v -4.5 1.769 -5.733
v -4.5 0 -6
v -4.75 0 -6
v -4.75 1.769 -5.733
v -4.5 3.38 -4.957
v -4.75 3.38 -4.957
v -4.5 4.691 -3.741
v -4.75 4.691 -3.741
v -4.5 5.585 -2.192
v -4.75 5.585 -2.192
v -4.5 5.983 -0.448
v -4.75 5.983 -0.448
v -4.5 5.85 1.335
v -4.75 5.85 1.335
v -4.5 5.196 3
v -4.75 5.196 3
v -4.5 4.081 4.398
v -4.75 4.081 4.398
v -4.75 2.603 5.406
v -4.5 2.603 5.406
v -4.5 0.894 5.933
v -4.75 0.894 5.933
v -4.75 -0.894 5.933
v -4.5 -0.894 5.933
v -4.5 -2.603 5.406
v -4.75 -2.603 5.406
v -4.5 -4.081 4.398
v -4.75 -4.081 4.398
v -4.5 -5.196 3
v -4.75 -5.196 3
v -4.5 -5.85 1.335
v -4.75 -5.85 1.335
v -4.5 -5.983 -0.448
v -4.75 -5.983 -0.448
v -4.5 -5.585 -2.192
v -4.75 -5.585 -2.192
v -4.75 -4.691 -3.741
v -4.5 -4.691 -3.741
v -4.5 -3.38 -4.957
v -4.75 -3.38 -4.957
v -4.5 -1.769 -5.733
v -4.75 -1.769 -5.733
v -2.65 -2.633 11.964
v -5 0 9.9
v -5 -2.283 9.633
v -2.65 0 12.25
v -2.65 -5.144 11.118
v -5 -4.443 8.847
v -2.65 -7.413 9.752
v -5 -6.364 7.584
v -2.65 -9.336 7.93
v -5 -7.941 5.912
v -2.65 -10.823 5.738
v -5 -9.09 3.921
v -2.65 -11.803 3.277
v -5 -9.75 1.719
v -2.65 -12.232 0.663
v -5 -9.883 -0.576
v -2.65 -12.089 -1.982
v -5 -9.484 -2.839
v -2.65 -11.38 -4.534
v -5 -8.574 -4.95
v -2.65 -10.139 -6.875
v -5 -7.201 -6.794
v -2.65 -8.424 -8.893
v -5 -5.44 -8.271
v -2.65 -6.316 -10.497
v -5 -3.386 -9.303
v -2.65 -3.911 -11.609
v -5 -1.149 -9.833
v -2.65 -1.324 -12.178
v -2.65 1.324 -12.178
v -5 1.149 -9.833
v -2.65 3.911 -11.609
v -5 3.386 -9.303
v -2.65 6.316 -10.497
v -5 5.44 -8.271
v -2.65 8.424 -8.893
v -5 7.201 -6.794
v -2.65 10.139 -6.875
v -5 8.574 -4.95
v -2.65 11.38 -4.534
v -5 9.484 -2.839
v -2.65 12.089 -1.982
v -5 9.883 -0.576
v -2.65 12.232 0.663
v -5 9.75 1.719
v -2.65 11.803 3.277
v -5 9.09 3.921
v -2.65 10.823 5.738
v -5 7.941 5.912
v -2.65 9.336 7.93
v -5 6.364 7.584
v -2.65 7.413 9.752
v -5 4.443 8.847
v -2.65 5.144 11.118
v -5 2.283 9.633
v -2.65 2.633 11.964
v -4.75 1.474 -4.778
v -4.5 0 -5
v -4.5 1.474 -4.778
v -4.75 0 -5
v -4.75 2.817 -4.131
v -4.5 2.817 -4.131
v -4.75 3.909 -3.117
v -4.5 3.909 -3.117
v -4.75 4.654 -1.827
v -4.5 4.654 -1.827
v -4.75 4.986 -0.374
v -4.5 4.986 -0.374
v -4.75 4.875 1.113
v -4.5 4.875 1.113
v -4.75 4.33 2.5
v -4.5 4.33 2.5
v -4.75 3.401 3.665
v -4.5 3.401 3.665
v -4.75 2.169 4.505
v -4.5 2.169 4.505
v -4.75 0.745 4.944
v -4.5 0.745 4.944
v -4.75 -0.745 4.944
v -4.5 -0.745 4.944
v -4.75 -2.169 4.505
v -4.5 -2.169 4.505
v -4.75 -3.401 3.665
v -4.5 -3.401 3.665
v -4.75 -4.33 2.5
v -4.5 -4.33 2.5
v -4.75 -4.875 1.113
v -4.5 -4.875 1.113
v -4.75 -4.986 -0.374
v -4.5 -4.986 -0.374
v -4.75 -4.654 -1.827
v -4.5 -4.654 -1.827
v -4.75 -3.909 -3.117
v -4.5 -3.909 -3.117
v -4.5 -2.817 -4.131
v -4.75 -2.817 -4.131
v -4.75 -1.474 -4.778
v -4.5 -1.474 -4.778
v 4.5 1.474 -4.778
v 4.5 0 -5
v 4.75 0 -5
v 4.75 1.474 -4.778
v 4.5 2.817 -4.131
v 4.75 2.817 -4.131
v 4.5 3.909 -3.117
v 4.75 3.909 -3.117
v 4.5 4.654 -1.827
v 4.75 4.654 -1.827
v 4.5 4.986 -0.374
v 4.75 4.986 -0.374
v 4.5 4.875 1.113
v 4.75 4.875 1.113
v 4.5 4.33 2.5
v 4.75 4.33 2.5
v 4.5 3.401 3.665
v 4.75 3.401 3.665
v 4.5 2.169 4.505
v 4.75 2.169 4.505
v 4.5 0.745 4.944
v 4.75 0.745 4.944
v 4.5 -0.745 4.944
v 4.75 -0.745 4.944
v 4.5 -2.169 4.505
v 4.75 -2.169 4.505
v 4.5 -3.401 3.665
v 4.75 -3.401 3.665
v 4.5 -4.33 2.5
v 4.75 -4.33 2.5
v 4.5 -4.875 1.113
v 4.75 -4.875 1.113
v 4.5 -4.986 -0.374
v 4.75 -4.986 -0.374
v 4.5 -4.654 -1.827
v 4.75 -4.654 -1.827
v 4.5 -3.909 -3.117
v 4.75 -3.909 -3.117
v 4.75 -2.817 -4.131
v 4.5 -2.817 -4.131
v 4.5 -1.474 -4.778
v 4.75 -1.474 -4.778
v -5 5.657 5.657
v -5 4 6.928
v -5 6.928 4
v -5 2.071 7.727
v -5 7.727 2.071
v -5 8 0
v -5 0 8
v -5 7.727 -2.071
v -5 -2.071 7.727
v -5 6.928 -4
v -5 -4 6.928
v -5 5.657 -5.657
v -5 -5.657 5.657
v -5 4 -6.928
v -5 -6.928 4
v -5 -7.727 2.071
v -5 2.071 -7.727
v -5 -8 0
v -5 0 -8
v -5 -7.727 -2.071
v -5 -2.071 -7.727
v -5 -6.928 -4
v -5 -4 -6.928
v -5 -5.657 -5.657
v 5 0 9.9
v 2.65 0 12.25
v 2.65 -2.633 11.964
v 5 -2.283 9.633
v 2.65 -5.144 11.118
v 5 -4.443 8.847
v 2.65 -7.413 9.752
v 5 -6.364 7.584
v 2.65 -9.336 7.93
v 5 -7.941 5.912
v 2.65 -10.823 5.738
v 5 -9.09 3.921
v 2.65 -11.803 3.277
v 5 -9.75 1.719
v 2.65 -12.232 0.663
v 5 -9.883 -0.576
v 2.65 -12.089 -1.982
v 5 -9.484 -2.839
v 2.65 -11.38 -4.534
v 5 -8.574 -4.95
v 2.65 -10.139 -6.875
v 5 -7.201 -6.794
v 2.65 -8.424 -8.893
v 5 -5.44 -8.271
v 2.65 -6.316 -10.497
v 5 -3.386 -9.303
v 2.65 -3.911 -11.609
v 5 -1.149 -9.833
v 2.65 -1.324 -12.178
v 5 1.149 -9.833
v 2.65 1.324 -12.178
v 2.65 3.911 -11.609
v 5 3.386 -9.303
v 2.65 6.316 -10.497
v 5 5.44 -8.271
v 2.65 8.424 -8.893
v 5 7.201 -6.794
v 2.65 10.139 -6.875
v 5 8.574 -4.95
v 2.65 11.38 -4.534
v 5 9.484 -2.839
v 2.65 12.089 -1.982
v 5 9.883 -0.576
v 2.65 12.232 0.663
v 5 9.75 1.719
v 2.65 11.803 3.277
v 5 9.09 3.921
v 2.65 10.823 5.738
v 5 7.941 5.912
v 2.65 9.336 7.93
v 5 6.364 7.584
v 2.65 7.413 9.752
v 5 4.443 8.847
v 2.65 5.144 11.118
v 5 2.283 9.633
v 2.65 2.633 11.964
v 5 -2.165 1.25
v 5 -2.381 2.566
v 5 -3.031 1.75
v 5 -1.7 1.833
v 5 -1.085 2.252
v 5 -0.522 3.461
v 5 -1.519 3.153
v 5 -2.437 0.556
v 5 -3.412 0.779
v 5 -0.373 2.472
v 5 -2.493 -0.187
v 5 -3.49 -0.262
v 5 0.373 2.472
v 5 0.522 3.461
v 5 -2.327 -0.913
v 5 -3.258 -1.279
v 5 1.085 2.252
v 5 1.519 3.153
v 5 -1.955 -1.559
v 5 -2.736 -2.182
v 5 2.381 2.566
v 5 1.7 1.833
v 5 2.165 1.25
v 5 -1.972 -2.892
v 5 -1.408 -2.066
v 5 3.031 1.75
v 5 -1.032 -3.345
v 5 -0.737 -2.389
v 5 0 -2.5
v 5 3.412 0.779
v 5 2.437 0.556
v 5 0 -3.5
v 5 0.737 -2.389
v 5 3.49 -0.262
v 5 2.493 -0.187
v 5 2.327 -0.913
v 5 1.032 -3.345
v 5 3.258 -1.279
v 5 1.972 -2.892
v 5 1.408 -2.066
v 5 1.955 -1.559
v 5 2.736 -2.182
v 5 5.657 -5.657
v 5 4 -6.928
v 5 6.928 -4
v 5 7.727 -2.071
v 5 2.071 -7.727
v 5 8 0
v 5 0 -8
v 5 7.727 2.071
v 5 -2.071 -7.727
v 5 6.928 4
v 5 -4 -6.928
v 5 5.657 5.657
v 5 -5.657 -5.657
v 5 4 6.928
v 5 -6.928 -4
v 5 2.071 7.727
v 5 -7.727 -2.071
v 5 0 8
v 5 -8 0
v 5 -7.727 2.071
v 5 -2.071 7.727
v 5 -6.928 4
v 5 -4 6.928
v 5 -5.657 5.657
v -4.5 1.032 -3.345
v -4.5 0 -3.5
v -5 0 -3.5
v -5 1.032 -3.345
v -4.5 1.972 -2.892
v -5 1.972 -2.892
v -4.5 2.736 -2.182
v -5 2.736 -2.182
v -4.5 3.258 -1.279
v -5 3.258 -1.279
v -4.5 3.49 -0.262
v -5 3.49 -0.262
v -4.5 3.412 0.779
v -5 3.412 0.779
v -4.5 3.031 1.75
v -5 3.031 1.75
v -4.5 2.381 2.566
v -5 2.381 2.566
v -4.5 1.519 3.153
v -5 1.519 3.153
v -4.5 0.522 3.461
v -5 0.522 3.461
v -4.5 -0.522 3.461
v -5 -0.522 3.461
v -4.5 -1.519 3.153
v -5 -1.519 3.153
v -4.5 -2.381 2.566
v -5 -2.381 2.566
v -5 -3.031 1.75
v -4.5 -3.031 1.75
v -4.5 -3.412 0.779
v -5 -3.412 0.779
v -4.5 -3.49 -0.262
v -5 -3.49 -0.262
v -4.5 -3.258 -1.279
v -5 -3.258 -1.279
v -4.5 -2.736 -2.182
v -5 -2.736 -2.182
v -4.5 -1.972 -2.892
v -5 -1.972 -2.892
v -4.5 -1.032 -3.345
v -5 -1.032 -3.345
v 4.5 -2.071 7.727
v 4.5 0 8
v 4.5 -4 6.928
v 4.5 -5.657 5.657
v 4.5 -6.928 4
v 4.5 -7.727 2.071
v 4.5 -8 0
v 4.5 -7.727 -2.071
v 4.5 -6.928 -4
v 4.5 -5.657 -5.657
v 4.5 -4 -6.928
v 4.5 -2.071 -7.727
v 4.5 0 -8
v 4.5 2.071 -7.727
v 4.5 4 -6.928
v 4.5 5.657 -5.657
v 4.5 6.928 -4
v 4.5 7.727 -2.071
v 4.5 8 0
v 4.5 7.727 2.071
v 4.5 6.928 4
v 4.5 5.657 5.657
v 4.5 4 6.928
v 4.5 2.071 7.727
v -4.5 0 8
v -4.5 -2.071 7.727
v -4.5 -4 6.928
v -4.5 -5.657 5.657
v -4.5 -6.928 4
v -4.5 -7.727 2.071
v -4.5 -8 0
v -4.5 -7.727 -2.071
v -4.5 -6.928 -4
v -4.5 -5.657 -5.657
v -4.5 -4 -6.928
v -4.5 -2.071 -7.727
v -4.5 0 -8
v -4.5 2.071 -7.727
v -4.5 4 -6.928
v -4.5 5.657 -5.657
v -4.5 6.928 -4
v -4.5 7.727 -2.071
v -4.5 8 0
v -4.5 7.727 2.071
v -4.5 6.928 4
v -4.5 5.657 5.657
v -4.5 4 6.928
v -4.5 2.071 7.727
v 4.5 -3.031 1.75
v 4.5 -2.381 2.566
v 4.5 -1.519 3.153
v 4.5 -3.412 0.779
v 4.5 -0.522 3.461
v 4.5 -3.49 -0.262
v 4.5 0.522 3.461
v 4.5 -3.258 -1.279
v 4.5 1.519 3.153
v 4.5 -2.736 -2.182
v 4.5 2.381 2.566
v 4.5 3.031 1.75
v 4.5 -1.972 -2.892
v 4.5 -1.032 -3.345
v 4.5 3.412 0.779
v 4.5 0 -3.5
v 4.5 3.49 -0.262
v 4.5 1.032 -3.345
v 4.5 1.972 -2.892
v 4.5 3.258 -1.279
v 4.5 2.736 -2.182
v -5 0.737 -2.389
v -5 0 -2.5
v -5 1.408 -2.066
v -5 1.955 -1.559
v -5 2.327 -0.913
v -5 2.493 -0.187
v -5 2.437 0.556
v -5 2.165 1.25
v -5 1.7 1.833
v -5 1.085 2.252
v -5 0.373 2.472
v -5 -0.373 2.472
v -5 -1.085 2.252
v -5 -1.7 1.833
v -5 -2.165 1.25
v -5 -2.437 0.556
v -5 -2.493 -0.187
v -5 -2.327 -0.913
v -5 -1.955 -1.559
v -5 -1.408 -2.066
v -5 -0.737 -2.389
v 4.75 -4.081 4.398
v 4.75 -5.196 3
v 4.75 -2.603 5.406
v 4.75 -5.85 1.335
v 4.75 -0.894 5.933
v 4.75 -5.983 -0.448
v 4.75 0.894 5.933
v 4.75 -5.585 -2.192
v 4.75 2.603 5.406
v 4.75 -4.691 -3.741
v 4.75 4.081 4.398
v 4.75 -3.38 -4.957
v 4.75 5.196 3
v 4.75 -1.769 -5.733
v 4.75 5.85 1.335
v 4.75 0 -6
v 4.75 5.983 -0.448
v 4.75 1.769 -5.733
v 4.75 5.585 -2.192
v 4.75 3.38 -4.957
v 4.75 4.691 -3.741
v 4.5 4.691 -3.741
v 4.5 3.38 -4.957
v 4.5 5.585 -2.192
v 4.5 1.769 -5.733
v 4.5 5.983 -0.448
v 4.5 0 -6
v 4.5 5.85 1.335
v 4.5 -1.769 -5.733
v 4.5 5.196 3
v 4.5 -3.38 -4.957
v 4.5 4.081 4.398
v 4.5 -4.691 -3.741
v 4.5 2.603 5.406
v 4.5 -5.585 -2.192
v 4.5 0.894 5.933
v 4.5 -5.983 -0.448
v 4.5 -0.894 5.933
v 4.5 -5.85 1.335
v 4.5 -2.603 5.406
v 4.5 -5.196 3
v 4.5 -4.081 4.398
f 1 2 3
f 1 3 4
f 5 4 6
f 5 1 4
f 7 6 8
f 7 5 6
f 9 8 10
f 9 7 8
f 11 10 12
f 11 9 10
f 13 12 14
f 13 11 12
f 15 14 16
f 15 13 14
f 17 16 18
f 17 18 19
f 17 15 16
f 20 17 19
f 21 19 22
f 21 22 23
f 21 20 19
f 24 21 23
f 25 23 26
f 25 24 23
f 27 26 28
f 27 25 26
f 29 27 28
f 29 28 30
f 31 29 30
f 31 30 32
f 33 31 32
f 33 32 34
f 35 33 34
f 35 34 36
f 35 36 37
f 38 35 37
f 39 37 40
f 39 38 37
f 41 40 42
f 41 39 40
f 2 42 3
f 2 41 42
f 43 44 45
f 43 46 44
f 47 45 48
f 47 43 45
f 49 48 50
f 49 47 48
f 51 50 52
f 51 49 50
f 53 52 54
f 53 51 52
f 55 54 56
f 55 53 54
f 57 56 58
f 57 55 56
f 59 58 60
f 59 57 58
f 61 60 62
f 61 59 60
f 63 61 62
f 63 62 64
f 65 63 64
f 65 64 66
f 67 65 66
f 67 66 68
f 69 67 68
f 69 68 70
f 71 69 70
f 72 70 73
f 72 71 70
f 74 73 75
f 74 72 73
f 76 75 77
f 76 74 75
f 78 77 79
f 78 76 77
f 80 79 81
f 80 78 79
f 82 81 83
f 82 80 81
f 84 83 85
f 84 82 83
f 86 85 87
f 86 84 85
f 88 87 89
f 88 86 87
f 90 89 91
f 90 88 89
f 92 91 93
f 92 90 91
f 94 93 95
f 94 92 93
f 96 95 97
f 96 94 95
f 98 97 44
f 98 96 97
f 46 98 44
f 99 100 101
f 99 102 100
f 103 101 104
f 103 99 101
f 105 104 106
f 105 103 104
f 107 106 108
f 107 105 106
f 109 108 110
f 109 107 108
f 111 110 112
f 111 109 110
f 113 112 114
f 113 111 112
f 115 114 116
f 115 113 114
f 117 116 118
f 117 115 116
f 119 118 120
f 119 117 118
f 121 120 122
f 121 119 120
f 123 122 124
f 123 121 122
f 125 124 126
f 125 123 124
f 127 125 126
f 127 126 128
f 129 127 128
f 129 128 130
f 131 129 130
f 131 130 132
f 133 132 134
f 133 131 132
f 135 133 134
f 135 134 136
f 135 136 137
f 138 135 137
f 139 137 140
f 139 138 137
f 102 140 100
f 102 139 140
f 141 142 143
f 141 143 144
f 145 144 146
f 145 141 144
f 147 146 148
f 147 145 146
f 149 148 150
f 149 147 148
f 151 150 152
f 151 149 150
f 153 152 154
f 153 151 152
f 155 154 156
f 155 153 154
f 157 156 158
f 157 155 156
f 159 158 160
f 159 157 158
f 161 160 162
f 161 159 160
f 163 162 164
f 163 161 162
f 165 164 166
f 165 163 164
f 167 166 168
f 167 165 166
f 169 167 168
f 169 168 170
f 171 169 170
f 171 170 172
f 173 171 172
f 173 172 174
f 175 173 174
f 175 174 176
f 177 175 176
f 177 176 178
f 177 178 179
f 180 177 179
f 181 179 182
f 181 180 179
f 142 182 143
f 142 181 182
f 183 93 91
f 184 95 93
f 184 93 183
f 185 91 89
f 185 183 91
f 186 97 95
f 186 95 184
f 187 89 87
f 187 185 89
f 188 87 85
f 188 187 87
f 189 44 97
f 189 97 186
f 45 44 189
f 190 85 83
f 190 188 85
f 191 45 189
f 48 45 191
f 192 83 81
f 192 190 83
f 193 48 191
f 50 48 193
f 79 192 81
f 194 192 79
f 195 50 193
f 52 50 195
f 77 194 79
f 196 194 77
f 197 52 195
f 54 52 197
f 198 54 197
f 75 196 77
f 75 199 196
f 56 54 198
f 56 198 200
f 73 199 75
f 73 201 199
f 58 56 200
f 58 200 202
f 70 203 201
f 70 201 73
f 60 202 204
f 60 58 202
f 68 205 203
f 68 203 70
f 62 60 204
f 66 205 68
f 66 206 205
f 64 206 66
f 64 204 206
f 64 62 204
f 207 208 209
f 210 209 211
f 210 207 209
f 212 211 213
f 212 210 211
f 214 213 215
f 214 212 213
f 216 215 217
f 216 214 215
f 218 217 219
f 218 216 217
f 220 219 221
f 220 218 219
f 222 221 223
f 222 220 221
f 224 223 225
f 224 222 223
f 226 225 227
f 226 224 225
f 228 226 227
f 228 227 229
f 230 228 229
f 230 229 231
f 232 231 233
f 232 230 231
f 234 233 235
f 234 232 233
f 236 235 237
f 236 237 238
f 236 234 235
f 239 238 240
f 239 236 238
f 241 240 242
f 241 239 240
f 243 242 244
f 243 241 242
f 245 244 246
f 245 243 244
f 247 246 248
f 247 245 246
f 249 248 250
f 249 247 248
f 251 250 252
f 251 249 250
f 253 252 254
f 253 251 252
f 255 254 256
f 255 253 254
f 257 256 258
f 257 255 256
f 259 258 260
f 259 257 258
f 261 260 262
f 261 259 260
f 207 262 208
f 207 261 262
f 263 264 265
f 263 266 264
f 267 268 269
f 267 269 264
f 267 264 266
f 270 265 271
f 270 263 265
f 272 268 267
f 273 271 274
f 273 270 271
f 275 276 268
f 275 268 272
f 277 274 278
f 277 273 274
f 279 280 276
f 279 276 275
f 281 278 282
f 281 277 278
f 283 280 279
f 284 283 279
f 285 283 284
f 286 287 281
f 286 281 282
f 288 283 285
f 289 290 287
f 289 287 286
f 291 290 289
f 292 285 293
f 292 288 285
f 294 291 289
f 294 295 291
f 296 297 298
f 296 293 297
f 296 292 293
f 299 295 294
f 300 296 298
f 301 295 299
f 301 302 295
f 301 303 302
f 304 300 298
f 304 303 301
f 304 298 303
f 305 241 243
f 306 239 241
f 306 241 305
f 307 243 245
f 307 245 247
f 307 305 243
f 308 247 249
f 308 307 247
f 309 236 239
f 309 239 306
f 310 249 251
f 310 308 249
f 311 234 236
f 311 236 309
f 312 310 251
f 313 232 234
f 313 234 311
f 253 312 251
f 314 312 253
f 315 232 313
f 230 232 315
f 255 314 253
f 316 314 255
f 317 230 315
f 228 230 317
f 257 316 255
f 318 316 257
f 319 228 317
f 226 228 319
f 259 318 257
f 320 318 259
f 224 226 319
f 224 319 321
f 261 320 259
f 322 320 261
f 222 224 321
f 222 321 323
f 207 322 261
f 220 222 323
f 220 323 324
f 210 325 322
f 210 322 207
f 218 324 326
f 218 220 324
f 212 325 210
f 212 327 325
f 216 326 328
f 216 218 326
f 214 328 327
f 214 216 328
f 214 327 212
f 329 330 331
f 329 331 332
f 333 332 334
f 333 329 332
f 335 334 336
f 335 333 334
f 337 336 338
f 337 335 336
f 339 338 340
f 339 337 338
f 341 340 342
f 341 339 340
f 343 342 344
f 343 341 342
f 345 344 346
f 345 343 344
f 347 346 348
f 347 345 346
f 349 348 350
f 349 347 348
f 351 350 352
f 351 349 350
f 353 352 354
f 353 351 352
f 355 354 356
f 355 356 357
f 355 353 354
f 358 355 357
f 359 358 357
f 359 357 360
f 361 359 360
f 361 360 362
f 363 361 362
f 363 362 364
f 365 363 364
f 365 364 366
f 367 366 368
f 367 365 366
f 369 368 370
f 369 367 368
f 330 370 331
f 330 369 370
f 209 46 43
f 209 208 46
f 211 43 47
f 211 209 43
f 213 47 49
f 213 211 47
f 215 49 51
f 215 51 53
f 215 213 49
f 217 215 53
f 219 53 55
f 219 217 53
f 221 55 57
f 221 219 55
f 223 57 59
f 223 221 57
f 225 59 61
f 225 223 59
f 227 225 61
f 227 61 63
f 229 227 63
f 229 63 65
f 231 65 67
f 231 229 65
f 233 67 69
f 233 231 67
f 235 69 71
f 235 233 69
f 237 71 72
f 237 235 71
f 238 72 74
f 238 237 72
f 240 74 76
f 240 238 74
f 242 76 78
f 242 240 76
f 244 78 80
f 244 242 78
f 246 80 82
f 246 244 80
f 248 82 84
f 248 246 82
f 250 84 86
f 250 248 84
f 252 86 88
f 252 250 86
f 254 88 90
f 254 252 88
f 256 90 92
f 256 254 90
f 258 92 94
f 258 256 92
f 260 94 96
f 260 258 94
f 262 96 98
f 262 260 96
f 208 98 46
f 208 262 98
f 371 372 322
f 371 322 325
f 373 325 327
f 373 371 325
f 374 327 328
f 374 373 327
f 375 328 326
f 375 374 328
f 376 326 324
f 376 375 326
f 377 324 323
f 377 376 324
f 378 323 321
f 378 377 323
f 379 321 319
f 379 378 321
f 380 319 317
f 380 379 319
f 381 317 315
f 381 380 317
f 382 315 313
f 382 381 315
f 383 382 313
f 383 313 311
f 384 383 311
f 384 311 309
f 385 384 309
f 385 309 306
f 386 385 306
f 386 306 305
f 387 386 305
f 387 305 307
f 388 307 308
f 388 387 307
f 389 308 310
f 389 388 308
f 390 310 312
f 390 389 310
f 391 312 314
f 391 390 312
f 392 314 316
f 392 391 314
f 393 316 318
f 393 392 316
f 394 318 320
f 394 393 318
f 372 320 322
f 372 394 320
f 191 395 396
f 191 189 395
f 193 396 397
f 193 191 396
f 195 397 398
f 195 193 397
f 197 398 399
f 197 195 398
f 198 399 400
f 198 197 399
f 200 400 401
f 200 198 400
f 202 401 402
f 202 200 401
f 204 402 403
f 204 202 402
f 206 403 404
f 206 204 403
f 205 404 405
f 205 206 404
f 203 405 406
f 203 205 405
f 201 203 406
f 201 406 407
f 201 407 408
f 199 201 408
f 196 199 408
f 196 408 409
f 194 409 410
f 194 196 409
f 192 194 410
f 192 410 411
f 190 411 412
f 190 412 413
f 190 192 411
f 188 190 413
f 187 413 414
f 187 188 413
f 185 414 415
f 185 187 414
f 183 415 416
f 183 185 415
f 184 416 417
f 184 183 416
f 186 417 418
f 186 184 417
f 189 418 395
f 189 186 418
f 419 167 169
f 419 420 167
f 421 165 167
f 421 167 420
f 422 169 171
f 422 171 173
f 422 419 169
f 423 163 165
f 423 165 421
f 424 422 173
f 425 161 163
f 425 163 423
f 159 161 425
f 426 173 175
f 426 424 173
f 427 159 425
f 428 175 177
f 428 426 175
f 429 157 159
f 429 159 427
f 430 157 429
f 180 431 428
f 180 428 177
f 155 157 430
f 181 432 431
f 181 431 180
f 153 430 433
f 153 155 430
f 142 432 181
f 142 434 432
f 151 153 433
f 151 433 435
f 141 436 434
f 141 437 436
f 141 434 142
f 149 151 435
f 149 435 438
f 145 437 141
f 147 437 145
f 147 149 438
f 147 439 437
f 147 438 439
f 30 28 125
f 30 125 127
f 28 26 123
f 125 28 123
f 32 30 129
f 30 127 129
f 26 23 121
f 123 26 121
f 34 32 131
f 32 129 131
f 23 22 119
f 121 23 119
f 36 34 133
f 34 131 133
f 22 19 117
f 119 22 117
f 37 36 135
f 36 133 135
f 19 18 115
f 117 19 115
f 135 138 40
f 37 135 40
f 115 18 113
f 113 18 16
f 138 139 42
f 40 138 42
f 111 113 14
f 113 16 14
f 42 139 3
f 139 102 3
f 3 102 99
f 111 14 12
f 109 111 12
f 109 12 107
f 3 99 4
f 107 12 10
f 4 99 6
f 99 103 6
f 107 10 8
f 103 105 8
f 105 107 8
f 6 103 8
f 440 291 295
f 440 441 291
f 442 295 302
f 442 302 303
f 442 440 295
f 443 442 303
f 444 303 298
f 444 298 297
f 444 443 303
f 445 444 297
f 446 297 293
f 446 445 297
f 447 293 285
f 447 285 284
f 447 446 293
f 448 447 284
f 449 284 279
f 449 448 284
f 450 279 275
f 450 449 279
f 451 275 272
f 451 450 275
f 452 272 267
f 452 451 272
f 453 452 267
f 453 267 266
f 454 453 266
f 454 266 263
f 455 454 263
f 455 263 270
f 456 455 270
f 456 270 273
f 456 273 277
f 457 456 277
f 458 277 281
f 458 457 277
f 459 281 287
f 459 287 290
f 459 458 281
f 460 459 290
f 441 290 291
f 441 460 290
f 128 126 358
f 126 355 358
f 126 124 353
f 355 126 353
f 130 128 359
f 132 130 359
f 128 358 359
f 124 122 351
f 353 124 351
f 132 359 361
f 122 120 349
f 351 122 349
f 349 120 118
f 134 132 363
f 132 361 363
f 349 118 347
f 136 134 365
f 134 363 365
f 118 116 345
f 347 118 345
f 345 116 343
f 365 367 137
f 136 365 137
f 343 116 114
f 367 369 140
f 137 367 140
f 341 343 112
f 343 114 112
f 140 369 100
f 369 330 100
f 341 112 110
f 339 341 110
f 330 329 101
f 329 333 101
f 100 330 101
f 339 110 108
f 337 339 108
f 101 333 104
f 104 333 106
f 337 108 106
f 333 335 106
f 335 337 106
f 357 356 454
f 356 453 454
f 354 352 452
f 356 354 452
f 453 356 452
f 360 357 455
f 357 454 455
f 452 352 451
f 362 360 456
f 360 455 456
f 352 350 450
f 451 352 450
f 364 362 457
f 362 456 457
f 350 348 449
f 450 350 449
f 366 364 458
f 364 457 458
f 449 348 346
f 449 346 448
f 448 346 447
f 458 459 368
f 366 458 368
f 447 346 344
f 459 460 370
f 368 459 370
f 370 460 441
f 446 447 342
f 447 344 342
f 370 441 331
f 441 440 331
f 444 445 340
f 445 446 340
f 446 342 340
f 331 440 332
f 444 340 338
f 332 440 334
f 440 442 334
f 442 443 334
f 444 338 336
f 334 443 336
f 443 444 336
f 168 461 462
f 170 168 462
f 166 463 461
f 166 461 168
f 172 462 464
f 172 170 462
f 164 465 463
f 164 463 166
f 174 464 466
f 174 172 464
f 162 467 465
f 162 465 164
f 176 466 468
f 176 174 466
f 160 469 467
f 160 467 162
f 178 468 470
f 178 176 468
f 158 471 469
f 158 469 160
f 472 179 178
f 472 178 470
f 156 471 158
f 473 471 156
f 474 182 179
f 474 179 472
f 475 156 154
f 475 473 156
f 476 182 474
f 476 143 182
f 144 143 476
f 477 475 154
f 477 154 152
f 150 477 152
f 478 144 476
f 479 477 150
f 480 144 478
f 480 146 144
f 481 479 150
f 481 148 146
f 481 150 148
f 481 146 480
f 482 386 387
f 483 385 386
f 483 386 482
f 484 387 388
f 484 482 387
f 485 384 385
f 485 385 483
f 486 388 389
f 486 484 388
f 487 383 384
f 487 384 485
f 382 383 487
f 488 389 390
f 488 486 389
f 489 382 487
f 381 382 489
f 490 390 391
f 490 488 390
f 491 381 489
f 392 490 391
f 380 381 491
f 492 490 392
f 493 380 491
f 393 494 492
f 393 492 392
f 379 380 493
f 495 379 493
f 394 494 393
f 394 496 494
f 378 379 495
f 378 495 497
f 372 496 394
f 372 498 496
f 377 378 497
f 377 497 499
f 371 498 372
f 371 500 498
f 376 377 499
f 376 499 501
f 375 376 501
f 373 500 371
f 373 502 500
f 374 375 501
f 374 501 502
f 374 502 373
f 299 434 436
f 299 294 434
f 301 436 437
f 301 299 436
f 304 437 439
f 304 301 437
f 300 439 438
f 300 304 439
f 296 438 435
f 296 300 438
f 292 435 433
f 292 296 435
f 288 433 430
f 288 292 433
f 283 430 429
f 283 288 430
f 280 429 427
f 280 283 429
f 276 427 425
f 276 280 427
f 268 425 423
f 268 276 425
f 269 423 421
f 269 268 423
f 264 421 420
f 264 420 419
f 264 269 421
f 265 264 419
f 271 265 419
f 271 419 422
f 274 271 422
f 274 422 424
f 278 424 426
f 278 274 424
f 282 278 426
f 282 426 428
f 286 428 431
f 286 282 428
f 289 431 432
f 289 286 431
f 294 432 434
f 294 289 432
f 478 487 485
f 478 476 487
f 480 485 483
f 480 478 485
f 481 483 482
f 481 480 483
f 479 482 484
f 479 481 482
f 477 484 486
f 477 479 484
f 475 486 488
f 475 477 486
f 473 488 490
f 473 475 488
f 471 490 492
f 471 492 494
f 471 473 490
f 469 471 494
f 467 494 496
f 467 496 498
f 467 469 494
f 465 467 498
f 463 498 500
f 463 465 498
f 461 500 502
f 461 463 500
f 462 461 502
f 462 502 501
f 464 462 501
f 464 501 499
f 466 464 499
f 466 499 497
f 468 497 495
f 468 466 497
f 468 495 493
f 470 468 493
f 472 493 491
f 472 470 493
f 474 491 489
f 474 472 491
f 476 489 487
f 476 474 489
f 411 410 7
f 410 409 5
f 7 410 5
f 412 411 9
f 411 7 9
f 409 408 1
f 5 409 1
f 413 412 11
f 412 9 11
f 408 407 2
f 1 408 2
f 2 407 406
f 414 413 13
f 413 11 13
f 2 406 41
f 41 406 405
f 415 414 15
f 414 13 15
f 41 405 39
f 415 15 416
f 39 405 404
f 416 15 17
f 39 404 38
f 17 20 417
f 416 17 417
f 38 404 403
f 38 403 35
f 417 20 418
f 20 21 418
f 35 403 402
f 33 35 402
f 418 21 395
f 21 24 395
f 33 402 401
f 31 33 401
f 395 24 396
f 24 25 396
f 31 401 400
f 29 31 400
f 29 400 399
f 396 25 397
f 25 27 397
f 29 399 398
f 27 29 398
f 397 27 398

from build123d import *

# Parameters (mm, degrees)
SKETCH3_R           = 8
SKETCH3_R_2         = 6
BOSS_EXTRUDE1_DEPTH = 4.5
SKETCH3_4_R         = 6
SKETCH3_4_R_2       = 5
BOSS_EXTRUDE3_DEPTH = 4.75
SKETCH3_5_R         = 5
SKETCH3_5_R_2       = 3.5
BOSS_EXTRUDE4_DEPTH = 4.5
SKETCH3_6_R         = 3.5
SKETCH3_6_R_2       = 2.5
BOSS_EXTRUDE5_DEPTH = 5


with BuildPart() as part:
    # Sketch2 → Revolve1 (revolve)
    with BuildSketch(Plane.XY):
        Polygon((-5, 8), (-5, 9.9), (-2.65, 12.25), (2.65, 12.25), (5, 9.9), (5, 8), align=None)
    revolve(axis=Axis((-45.586046512, 0, 0), (1, 0, 0)))

    # Sketch3 → Boss-Extrude1 (add, symmetric)
    with BuildSketch(Plane(origin=(0, 0, 0), x_dir=(0, 0, -1), z_dir=(1, 0, 0))):
        Circle(SKETCH3_R)
        Circle(SKETCH3_R_2, mode=Mode.SUBTRACT)
    extrude(amount=BOSS_EXTRUDE1_DEPTH, both=True)

    # Sketch3<4> → Boss-Extrude3 (add, symmetric)
    with BuildSketch(Plane(origin=(0, 0, 0), x_dir=(0, 0, -1), z_dir=(1, 0, 0))):
        Circle(SKETCH3_4_R)
        Circle(SKETCH3_4_R_2, mode=Mode.SUBTRACT)
    extrude(amount=BOSS_EXTRUDE3_DEPTH, both=True)

    # Sketch3<5> → Boss-Extrude4 (add, symmetric)
    with BuildSketch(Plane(origin=(0, 0, 0), x_dir=(0, 0, -1), z_dir=(1, 0, 0))):
        Circle(SKETCH3_5_R)
        Circle(SKETCH3_5_R_2, mode=Mode.SUBTRACT)
    extrude(amount=BOSS_EXTRUDE4_DEPTH, both=True)

    # Sketch3<6> → Boss-Extrude5 (add, symmetric)
    with BuildSketch(Plane(origin=(0, 0, 0), x_dir=(0, 0, -1), z_dir=(1, 0, 0))):
        Circle(SKETCH3_6_R)
        Circle(SKETCH3_6_R_2, mode=Mode.SUBTRACT)
    extrude(amount=BOSS_EXTRUDE5_DEPTH, both=True)


solid = part.part
